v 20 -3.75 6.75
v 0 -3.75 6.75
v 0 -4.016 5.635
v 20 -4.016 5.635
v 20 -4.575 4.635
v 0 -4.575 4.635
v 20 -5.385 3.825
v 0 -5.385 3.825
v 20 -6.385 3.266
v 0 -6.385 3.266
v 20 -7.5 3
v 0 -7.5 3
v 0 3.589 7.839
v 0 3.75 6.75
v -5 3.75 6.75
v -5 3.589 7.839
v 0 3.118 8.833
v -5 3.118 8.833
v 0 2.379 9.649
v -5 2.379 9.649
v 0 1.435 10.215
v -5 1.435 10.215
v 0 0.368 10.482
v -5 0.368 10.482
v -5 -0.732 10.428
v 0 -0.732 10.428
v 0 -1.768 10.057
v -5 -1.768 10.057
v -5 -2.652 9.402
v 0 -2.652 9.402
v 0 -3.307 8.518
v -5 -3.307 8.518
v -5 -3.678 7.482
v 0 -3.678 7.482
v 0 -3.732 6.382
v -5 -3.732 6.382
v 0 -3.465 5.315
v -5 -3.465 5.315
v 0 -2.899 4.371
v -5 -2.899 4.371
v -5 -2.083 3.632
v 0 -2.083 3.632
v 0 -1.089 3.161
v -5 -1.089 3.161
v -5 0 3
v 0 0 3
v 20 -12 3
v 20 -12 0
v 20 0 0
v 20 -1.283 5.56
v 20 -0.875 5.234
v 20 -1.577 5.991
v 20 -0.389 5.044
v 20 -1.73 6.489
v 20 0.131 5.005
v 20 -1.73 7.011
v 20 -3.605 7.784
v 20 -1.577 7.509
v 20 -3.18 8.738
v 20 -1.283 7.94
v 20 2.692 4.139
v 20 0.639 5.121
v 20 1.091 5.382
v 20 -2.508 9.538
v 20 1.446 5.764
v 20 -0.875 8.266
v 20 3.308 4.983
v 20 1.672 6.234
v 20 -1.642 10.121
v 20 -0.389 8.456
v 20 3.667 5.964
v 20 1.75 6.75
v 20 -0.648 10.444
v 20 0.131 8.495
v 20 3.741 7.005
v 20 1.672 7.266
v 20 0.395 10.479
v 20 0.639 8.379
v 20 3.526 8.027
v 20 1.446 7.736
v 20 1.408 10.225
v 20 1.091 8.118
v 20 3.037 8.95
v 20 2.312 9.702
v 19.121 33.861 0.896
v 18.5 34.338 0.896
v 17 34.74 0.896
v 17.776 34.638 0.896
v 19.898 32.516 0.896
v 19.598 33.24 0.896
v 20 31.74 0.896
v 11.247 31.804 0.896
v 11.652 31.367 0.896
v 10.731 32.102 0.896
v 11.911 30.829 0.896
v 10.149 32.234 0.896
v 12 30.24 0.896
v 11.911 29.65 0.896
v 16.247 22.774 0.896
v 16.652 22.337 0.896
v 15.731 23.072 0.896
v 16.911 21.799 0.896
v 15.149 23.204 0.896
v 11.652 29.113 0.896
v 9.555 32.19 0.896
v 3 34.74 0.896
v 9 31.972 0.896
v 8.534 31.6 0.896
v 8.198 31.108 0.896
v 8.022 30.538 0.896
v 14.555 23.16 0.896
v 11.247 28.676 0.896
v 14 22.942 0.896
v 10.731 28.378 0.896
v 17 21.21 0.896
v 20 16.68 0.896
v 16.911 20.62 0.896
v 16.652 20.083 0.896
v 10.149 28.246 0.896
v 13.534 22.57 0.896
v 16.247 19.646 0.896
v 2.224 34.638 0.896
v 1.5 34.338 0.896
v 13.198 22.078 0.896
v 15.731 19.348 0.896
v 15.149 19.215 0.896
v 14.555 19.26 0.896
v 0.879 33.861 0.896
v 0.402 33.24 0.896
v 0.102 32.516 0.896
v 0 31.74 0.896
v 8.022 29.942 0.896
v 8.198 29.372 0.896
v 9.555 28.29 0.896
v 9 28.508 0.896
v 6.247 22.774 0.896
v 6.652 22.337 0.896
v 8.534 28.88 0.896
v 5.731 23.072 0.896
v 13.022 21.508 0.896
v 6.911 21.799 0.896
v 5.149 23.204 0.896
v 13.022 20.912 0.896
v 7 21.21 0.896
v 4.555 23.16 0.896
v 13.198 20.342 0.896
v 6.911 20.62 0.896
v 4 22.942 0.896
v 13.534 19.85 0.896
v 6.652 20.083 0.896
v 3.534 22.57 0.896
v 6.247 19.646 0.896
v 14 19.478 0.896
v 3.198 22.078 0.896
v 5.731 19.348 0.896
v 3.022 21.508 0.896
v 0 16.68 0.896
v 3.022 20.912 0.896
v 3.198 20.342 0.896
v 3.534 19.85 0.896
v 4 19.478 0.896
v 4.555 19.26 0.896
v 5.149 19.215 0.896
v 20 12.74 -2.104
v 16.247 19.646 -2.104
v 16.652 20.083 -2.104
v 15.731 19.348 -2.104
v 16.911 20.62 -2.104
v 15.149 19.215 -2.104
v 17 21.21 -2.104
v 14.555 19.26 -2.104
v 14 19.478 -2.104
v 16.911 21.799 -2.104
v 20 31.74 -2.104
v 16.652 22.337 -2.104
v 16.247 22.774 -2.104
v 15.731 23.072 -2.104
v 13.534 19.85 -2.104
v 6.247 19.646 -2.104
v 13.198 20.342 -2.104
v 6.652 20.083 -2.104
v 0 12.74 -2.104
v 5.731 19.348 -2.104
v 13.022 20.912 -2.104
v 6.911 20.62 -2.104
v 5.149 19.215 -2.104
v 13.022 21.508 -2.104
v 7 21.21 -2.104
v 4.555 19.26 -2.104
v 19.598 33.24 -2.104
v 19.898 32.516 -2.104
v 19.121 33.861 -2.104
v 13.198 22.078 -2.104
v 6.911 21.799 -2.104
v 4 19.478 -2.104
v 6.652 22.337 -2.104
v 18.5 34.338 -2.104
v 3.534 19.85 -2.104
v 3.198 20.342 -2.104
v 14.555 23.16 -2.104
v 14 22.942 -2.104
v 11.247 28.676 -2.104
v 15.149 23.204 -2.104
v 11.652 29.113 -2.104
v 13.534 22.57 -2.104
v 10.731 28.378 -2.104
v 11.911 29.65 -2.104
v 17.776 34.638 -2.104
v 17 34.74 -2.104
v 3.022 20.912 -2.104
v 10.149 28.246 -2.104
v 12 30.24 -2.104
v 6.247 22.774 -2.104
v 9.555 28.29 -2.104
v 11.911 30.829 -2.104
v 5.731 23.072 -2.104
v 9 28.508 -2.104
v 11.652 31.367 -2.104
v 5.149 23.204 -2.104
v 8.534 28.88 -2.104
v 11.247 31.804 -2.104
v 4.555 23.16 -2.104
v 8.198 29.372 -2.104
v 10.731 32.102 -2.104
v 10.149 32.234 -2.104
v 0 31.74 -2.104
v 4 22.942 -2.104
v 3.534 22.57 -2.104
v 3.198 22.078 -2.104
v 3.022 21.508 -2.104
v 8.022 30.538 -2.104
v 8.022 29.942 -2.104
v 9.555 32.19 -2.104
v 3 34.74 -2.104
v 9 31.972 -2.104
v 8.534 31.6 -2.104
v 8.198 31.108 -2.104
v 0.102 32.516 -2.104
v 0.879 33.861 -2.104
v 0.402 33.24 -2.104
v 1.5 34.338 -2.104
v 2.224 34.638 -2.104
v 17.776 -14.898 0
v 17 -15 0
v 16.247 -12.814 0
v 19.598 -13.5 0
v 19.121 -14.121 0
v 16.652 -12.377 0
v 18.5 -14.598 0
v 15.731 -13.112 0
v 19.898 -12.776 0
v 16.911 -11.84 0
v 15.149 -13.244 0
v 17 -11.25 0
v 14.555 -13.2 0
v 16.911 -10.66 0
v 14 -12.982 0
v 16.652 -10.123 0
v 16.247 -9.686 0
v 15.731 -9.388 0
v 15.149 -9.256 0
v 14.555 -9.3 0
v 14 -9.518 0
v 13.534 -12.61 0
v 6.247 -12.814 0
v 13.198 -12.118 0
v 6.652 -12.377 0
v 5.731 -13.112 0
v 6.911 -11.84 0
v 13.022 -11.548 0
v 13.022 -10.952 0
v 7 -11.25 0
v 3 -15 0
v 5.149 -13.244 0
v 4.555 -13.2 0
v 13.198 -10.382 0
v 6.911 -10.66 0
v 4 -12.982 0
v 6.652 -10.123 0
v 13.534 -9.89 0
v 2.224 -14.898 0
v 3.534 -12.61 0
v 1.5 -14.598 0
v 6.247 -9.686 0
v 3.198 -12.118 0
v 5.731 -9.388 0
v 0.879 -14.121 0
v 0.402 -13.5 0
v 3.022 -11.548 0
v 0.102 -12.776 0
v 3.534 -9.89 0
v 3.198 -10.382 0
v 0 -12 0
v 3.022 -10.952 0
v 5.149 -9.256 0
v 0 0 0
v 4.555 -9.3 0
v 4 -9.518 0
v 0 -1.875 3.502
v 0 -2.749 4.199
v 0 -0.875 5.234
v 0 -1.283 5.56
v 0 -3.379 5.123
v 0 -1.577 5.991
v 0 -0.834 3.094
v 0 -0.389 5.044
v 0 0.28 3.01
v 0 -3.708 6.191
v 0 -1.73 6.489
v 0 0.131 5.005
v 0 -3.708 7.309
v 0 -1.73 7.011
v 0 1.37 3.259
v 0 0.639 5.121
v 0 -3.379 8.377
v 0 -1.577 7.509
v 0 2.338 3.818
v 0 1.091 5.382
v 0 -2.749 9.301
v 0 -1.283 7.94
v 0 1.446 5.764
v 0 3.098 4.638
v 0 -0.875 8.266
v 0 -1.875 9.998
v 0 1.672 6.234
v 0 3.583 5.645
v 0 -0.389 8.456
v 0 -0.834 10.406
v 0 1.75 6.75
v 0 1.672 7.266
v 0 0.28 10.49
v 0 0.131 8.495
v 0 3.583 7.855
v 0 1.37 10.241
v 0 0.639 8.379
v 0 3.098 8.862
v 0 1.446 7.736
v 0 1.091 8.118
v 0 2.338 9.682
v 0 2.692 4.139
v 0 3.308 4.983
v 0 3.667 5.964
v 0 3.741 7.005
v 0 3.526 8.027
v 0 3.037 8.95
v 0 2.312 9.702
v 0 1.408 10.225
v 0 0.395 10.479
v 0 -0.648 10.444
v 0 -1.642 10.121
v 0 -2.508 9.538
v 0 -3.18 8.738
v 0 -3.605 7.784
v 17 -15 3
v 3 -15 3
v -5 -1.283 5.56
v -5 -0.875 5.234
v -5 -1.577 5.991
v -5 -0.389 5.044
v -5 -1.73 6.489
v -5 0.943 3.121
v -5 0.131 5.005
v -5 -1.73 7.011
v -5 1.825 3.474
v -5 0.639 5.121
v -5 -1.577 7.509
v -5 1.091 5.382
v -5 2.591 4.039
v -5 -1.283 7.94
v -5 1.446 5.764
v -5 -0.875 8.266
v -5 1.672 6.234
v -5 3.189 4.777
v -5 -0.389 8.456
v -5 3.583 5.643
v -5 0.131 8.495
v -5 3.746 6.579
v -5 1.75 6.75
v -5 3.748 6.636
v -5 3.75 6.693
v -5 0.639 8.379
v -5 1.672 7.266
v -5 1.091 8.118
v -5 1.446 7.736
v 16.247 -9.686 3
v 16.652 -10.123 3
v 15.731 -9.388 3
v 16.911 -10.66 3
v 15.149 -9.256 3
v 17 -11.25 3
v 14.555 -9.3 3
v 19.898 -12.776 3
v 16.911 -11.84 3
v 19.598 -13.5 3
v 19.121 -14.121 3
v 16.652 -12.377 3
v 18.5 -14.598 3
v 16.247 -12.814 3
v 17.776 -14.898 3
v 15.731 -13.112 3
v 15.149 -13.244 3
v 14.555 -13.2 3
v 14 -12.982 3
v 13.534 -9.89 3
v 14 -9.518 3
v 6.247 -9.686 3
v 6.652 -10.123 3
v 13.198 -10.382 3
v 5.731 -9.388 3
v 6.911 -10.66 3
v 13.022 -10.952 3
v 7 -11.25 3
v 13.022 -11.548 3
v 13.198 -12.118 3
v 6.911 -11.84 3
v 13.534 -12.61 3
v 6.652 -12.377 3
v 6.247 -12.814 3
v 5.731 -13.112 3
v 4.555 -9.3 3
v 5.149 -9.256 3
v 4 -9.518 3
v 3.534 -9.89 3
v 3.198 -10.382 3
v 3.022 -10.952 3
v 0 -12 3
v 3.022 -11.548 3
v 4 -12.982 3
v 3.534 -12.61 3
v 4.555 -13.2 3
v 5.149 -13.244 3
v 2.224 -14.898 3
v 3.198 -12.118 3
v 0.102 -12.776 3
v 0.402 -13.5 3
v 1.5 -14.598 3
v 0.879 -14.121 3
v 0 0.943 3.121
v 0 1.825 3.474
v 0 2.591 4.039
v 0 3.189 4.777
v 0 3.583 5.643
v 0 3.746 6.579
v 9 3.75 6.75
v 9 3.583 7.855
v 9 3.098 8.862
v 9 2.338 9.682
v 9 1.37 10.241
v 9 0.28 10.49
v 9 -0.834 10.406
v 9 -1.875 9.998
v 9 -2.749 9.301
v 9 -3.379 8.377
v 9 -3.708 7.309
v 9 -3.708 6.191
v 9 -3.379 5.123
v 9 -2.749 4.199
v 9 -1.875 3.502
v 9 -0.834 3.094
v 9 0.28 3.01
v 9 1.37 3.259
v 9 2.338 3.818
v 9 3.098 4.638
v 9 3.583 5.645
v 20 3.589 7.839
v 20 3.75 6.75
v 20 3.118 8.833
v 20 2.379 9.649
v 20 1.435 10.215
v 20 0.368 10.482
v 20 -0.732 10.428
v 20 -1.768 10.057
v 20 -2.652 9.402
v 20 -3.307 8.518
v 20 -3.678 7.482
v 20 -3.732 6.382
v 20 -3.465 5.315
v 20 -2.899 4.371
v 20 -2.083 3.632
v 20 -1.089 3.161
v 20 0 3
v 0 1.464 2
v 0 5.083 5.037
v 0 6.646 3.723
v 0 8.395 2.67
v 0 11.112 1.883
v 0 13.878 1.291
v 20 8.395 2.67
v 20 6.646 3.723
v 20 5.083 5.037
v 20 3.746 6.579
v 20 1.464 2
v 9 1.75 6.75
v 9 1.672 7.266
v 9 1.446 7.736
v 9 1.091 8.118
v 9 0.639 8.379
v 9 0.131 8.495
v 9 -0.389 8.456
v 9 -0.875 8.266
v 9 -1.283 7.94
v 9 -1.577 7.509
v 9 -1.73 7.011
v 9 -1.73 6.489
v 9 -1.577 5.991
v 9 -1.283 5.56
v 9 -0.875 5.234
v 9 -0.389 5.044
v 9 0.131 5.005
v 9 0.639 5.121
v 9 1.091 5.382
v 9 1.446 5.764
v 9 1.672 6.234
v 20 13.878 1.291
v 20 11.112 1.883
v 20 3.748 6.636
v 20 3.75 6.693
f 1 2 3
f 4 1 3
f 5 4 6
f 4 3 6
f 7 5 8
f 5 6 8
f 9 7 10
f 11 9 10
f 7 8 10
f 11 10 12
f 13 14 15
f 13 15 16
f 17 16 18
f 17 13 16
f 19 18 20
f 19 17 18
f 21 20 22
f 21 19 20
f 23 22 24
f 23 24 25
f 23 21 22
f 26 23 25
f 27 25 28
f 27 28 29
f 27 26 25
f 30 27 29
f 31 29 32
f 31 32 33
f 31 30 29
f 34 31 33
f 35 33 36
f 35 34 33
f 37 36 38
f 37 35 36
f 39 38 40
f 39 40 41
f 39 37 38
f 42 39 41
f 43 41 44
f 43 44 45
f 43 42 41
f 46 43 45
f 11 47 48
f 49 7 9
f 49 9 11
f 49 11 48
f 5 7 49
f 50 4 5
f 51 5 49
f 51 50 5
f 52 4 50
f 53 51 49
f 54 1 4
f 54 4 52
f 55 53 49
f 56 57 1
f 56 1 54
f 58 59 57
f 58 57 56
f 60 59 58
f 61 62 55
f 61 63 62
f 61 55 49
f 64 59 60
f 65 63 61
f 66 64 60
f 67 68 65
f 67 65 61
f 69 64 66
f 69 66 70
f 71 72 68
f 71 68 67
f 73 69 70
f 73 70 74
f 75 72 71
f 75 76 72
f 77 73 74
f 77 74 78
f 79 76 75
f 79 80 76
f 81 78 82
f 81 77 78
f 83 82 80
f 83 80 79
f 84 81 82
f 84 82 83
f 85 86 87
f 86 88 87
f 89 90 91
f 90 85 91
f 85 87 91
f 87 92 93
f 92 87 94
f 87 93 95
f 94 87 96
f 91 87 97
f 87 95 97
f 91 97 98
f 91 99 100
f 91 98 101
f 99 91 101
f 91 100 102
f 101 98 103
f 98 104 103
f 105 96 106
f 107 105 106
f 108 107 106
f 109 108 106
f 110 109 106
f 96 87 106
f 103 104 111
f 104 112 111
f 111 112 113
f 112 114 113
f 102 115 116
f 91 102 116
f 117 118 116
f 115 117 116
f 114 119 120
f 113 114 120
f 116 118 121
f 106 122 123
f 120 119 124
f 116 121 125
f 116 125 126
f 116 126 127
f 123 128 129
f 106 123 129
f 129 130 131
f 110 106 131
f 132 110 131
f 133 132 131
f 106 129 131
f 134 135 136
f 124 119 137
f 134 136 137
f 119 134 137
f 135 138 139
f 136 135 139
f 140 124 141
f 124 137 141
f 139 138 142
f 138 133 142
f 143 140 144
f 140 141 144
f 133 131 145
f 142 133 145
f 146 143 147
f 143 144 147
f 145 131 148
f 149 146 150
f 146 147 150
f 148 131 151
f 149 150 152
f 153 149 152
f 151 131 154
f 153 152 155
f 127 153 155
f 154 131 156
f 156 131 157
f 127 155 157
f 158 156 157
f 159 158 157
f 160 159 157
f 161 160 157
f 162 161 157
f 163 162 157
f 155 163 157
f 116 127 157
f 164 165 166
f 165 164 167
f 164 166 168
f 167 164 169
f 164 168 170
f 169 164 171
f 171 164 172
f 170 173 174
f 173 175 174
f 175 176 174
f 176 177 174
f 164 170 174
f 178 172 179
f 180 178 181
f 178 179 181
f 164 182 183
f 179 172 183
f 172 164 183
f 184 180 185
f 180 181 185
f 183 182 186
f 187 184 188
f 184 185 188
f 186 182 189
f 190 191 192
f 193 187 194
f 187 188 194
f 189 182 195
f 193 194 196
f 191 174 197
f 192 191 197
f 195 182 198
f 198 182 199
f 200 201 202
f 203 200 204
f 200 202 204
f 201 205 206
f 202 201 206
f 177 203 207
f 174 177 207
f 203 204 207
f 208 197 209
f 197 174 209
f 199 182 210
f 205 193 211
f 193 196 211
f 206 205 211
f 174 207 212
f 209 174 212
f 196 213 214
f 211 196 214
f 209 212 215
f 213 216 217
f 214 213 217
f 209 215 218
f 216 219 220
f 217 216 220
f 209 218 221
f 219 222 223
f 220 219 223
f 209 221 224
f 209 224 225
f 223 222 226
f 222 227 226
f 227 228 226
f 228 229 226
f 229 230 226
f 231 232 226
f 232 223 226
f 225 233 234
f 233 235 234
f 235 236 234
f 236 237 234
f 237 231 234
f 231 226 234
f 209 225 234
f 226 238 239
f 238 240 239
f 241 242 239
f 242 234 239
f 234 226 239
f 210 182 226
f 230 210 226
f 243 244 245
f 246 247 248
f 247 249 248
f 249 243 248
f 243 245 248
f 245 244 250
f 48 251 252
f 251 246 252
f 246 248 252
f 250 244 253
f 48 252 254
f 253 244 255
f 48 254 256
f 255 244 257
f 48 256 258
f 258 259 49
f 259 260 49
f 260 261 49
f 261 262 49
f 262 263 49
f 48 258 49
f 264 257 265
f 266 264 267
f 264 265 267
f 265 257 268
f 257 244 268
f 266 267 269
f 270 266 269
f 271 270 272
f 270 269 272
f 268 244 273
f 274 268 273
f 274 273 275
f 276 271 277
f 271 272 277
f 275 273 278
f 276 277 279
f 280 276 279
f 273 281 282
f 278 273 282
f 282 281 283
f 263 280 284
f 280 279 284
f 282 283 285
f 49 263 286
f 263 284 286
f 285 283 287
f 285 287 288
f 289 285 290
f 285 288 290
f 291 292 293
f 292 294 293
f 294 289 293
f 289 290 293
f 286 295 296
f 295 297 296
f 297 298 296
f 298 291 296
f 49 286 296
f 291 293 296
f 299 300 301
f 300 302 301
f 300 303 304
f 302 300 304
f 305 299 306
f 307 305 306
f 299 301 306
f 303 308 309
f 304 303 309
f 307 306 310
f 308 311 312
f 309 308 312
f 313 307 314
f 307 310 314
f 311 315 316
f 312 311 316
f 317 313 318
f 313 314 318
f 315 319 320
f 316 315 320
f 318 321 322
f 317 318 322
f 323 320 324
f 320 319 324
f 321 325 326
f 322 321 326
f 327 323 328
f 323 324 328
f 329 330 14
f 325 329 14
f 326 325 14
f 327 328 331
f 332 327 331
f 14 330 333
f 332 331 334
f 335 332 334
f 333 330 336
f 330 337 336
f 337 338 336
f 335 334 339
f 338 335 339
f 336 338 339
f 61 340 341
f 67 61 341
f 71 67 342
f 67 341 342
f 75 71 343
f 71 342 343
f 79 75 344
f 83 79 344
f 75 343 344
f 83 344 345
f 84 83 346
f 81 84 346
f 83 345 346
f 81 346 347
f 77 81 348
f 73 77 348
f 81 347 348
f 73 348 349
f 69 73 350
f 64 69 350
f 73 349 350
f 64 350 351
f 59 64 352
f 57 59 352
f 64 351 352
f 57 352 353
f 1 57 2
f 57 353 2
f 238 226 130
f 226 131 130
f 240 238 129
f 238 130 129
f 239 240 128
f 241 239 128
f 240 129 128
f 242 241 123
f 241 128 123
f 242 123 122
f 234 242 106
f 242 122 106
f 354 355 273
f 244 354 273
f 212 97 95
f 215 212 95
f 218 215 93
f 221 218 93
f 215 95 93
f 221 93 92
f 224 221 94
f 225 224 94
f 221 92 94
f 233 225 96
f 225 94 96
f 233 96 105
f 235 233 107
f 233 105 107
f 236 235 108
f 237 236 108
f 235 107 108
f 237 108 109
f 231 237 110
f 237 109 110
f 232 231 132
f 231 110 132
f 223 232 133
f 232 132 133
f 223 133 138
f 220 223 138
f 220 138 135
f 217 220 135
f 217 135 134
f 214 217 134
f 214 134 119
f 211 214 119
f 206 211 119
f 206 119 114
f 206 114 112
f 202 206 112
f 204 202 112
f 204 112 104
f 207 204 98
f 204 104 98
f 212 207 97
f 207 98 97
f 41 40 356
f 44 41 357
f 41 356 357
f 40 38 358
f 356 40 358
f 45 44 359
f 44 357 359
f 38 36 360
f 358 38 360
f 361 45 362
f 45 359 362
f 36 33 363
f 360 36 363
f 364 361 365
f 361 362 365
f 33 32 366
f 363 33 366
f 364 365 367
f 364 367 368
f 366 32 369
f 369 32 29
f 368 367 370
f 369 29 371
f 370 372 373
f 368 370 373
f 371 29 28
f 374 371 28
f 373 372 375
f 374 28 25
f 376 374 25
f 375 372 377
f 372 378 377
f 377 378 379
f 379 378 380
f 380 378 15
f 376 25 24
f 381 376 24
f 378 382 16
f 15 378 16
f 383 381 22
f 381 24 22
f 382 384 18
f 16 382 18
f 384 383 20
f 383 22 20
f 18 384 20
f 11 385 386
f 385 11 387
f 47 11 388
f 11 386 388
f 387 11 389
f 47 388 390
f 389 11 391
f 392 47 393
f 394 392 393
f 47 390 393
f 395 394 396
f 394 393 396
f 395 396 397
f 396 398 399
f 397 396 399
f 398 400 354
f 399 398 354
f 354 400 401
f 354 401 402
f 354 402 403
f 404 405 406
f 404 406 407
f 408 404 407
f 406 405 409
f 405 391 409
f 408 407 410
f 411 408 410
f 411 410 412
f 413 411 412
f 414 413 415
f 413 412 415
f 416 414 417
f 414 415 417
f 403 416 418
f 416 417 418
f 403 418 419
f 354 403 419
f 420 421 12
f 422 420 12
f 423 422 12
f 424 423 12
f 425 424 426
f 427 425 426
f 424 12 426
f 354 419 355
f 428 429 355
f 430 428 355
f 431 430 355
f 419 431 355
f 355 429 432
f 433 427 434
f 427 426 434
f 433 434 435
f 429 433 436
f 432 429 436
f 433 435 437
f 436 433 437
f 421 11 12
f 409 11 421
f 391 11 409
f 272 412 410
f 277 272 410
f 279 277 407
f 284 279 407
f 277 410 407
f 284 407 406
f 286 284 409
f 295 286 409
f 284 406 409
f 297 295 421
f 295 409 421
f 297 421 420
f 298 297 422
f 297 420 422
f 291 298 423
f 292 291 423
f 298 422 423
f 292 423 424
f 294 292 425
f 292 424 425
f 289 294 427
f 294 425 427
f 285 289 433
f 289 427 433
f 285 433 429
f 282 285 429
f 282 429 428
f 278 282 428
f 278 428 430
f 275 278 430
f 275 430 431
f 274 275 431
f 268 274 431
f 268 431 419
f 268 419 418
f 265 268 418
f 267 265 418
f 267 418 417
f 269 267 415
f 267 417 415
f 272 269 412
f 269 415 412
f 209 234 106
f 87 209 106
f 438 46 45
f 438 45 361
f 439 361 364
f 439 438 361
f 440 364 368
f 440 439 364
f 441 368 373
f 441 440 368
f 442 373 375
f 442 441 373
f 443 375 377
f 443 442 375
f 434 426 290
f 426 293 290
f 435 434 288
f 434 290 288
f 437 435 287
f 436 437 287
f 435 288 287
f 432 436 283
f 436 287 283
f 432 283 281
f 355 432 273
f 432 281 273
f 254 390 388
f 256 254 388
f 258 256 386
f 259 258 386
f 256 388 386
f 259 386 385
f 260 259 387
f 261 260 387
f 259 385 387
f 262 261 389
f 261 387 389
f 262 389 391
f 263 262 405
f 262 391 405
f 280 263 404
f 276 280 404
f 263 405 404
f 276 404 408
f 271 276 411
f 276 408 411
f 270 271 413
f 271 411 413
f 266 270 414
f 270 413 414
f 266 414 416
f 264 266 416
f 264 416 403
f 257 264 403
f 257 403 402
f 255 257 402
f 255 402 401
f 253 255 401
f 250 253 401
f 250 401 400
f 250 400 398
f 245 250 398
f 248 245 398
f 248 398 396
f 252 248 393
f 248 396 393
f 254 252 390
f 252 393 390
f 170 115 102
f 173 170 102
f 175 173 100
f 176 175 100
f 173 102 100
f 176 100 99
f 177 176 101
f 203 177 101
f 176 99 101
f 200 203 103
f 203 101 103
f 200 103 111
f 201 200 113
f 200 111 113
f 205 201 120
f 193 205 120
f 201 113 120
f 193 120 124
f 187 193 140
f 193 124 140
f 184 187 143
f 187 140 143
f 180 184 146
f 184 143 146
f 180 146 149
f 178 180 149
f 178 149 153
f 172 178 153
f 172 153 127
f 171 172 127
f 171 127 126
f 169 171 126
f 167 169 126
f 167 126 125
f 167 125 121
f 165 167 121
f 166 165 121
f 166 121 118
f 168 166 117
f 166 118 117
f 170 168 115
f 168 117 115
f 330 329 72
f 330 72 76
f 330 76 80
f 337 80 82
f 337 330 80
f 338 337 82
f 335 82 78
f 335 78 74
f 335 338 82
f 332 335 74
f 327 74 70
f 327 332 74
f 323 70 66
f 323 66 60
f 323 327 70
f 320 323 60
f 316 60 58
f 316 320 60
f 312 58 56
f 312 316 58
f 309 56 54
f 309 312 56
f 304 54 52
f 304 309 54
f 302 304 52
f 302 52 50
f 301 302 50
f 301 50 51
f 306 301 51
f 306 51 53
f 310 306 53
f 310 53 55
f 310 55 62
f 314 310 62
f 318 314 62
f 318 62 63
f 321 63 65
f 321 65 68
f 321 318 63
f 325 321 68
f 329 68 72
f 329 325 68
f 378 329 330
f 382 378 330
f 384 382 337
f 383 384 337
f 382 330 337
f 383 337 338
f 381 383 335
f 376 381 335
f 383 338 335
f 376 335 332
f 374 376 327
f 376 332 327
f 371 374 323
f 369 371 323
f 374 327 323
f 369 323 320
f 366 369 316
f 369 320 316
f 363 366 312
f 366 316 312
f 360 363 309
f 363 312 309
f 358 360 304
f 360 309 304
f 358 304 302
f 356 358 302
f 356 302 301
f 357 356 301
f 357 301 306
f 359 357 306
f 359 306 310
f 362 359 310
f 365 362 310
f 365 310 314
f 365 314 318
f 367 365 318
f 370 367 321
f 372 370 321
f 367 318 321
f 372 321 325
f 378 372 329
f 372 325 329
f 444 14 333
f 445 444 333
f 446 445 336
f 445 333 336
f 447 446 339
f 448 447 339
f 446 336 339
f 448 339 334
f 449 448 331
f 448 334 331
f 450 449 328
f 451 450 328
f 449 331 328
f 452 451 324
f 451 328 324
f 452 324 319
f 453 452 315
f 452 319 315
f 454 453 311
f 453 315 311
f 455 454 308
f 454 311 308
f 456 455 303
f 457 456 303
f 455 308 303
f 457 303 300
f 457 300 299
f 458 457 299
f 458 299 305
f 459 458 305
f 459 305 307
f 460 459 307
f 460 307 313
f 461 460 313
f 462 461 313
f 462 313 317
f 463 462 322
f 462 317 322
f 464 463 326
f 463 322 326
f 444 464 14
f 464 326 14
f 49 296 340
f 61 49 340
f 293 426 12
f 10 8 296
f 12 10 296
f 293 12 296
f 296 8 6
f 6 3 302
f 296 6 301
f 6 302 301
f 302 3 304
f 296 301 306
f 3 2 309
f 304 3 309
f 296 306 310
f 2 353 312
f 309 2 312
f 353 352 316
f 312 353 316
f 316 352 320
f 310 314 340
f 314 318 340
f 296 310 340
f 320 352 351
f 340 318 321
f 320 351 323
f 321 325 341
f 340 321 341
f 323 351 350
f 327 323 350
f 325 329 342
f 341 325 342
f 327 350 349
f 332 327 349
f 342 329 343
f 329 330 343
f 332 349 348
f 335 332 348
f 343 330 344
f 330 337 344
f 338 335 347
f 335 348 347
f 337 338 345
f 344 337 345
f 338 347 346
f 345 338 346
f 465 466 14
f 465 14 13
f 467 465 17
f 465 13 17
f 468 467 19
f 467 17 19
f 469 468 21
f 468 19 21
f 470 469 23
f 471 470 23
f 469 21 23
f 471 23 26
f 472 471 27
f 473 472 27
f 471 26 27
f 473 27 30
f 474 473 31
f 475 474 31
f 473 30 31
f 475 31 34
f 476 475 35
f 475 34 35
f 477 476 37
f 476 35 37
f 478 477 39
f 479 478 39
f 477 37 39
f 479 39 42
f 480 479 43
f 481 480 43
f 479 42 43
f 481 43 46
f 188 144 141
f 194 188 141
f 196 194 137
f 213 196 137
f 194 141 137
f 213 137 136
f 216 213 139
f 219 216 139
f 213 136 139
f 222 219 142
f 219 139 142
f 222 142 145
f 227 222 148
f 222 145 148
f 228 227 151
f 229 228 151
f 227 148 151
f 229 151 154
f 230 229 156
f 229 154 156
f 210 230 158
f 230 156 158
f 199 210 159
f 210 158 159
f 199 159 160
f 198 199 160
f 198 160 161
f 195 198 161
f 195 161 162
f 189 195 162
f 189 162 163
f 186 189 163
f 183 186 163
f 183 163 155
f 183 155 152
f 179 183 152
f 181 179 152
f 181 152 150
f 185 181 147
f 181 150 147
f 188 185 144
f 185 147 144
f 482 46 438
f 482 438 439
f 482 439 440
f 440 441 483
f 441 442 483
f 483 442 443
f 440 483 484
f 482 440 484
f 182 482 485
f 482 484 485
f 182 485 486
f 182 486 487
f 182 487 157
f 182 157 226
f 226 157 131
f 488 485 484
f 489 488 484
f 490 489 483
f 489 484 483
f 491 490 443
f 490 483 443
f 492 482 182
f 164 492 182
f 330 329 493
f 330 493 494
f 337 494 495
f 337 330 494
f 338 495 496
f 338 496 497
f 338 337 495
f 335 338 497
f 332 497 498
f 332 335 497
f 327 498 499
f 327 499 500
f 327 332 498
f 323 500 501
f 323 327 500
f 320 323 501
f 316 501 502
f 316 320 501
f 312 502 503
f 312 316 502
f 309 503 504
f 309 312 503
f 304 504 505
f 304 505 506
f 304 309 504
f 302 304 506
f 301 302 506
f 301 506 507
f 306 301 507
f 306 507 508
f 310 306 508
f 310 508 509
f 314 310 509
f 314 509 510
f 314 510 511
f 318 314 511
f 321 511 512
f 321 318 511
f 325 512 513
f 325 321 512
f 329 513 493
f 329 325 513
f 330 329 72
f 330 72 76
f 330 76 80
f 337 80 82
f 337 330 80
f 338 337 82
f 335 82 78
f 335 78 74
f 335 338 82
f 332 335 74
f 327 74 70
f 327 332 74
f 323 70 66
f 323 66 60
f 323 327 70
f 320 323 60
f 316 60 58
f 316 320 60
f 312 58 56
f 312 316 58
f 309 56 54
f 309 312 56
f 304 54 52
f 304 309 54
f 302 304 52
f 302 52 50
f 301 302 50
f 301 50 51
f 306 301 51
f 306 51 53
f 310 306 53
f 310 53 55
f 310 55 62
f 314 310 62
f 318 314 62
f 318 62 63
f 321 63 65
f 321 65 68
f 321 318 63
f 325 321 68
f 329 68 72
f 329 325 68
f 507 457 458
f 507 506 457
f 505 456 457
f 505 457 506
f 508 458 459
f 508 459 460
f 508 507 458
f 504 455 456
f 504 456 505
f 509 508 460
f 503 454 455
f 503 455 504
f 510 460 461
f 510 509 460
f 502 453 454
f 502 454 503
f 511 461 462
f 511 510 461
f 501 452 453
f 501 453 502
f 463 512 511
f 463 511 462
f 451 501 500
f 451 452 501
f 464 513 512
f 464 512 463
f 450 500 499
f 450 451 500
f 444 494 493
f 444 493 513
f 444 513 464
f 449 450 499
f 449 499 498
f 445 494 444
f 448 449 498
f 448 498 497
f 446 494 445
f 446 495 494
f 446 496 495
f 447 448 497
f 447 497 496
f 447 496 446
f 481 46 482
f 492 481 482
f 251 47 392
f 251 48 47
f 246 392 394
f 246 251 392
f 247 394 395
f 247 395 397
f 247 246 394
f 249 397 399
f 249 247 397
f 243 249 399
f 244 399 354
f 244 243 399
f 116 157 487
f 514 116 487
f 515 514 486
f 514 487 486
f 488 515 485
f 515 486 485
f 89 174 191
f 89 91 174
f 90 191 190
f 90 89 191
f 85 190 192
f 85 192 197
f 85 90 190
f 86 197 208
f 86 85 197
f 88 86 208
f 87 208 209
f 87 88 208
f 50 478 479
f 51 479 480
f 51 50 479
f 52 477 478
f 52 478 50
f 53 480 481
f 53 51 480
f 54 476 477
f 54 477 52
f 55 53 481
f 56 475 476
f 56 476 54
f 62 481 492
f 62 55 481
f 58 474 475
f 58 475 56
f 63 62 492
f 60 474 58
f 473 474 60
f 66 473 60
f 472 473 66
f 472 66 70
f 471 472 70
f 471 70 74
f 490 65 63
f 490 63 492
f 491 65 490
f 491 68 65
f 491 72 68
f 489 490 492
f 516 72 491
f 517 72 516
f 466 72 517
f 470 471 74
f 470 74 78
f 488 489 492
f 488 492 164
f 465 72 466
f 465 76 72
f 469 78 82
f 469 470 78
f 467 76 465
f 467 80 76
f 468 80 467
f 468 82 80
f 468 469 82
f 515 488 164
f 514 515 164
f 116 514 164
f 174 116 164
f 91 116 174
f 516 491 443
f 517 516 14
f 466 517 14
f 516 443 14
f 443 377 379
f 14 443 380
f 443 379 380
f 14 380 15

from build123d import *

# Parameters (mm, degrees)
F0_R      = 1.75
F1_DEPTH  = 20
F2_R      = 2
F3_DEPTH  = 3
F4_R      = 3
F5_R      = 1.75
F6_DEPTH  = 5
F7_DEPTH  = 20
F8_R      = 3
F9_R      = 2
F10_DEPTH = 3
F11_R     = 3.75
F11_R_2   = 1.75
F12_DEPTH = 9


with BuildPart() as f1:
    # F0 (on Right) → F1 (new body)
    with BuildSketch(Plane.YZ):
        with BuildLine():
            Line((0, 0), (2.6920669918, 4.1393917737))
            ThreePointArc((2.6920669918, 4.1393917737), (1.4084120101, 10.2254676822), (-3.75, 6.75))
            ThreePointArc((-3.75, 6.75), (-4.9520679105, 4.2020679105), (-7.5, 3))
            Line((-7.5, 3), (-15, 3))
            Line((-15, 3), (-15, 0))
            Line((-15, 0), (0, 0))
        make_face()
        with Locations((0, 6.75)):
            Circle(F0_R, mode=Mode.SUBTRACT)
    extrude(amount=F1_DEPTH)

    # F2 (on face) → F3 (cut, through all)
    with BuildSketch(Plane.XY.offset(3)):
        with Locations((5, -11.25)):
            Circle(F2_R)
        with Locations((15, -11.25)):
            Circle(F2_R)
    extrude(amount=-F3_DEPTH, mode=Mode.SUBTRACT)

    # F4
    f4_edges = [f1.edges().sort_by_distance(p)[0] for p in [
        (0, -15, 1.5),
        (20, -15, 1.5),
    ]]
    fillet(f4_edges, radius=F4_R)


with BuildPart() as f6:
    # F5 (on Right) → F6 (new body)
    with BuildSketch(Plane.YZ):
        with BuildLine():
            ThreePointArc((3.7461060092, 6.5791498681), (3.7490263759, 6.6645527491), (3.75, 6.75))
            ThreePointArc((3.75, 6.75), (-2.6516504294, 9.4016504294), (0, 3))
            ThreePointArc((0, 3), (2.5905416427, 4.0386176962), (3.7461060092, 6.5791498681))
        make_face()
        with Locations((0, 6.75)):
            Circle(F5_R, mode=Mode.SUBTRACT)
    extrude(amount=-F6_DEPTH)

    # F5 (on Right) → F7 (join)
    with BuildSketch(Plane.YZ):
        with BuildLine():
            ThreePointArc((3.7461060092, 6.5791498681), (2.5905416427, 4.0386176962), (0, 3))
            Line((0, 3), (1.4636747047, 2))
            Line((1.4636747047, 2), (12.7399861541, -2.1042417199))
            Line((12.7399861541, -2.1042417199), (34.7399861541, -2.1042417199))
            Line((34.7399861541, -2.1042417199), (34.7399861541, 0.8957582801))
            Line((34.7399861541, 0.8957582801), (16.6797647775, 0.8957582801))
            ThreePointArc((16.6797647775, 0.8957582801), (12.4900492437, 1.5628328948), (8.3945510088, 2.6699006453))
            ThreePointArc((8.3945510088, 2.6699006453), (5.8388205012, 4.349241646), (3.7461060092, 6.5791498681))
        make_face()
        with BuildLine():
            ThreePointArc((3.7461060092, 6.5791498681), (3.7490263759, 6.6645527491), (3.75, 6.75))
            ThreePointArc((3.75, 6.75), (-2.6516504294, 9.4016504294), (0, 3))
            ThreePointArc((0, 3), (2.5905416427, 4.0386176962), (3.7461060092, 6.5791498681))
        make_face()
        with Locations((0, 6.75)):
            Circle(F5_R, mode=Mode.SUBTRACT)
    extrude(amount=F7_DEPTH)

    # F8
    f8_edges = [f6.edges().sort_by_distance(p)[0] for p in [
        (20, 34.739986, -0.604242),
        (0, 34.739986, -0.604242),
    ]]
    fillet(f8_edges, radius=F8_R)

    # F9 (on face) → F10 (cut, through all)
    with BuildSketch(Plane.XY.offset(0.8957582801)):
        with Locations((10, 30.2399861541)):
            Circle(F9_R)
        with Locations((5, 21.2098754658)):
            Circle(F9_R)
        with Locations((15, 21.2098754658)):
            Circle(F9_R)
    extrude(amount=-F10_DEPTH, mode=Mode.SUBTRACT)


with BuildPart() as f12:
    # F11 (on Right) → F12 (new body)
    with BuildSketch(Plane.YZ):
        with Locations((0, 6.75)):
            Circle(F11_R)
        with Locations((0, 6.75)):
            Circle(F11_R_2, mode=Mode.SUBTRACT)
    extrude(amount=F12_DEPTH)


solid = Compound([f1.part, f6.part, f12.part])
